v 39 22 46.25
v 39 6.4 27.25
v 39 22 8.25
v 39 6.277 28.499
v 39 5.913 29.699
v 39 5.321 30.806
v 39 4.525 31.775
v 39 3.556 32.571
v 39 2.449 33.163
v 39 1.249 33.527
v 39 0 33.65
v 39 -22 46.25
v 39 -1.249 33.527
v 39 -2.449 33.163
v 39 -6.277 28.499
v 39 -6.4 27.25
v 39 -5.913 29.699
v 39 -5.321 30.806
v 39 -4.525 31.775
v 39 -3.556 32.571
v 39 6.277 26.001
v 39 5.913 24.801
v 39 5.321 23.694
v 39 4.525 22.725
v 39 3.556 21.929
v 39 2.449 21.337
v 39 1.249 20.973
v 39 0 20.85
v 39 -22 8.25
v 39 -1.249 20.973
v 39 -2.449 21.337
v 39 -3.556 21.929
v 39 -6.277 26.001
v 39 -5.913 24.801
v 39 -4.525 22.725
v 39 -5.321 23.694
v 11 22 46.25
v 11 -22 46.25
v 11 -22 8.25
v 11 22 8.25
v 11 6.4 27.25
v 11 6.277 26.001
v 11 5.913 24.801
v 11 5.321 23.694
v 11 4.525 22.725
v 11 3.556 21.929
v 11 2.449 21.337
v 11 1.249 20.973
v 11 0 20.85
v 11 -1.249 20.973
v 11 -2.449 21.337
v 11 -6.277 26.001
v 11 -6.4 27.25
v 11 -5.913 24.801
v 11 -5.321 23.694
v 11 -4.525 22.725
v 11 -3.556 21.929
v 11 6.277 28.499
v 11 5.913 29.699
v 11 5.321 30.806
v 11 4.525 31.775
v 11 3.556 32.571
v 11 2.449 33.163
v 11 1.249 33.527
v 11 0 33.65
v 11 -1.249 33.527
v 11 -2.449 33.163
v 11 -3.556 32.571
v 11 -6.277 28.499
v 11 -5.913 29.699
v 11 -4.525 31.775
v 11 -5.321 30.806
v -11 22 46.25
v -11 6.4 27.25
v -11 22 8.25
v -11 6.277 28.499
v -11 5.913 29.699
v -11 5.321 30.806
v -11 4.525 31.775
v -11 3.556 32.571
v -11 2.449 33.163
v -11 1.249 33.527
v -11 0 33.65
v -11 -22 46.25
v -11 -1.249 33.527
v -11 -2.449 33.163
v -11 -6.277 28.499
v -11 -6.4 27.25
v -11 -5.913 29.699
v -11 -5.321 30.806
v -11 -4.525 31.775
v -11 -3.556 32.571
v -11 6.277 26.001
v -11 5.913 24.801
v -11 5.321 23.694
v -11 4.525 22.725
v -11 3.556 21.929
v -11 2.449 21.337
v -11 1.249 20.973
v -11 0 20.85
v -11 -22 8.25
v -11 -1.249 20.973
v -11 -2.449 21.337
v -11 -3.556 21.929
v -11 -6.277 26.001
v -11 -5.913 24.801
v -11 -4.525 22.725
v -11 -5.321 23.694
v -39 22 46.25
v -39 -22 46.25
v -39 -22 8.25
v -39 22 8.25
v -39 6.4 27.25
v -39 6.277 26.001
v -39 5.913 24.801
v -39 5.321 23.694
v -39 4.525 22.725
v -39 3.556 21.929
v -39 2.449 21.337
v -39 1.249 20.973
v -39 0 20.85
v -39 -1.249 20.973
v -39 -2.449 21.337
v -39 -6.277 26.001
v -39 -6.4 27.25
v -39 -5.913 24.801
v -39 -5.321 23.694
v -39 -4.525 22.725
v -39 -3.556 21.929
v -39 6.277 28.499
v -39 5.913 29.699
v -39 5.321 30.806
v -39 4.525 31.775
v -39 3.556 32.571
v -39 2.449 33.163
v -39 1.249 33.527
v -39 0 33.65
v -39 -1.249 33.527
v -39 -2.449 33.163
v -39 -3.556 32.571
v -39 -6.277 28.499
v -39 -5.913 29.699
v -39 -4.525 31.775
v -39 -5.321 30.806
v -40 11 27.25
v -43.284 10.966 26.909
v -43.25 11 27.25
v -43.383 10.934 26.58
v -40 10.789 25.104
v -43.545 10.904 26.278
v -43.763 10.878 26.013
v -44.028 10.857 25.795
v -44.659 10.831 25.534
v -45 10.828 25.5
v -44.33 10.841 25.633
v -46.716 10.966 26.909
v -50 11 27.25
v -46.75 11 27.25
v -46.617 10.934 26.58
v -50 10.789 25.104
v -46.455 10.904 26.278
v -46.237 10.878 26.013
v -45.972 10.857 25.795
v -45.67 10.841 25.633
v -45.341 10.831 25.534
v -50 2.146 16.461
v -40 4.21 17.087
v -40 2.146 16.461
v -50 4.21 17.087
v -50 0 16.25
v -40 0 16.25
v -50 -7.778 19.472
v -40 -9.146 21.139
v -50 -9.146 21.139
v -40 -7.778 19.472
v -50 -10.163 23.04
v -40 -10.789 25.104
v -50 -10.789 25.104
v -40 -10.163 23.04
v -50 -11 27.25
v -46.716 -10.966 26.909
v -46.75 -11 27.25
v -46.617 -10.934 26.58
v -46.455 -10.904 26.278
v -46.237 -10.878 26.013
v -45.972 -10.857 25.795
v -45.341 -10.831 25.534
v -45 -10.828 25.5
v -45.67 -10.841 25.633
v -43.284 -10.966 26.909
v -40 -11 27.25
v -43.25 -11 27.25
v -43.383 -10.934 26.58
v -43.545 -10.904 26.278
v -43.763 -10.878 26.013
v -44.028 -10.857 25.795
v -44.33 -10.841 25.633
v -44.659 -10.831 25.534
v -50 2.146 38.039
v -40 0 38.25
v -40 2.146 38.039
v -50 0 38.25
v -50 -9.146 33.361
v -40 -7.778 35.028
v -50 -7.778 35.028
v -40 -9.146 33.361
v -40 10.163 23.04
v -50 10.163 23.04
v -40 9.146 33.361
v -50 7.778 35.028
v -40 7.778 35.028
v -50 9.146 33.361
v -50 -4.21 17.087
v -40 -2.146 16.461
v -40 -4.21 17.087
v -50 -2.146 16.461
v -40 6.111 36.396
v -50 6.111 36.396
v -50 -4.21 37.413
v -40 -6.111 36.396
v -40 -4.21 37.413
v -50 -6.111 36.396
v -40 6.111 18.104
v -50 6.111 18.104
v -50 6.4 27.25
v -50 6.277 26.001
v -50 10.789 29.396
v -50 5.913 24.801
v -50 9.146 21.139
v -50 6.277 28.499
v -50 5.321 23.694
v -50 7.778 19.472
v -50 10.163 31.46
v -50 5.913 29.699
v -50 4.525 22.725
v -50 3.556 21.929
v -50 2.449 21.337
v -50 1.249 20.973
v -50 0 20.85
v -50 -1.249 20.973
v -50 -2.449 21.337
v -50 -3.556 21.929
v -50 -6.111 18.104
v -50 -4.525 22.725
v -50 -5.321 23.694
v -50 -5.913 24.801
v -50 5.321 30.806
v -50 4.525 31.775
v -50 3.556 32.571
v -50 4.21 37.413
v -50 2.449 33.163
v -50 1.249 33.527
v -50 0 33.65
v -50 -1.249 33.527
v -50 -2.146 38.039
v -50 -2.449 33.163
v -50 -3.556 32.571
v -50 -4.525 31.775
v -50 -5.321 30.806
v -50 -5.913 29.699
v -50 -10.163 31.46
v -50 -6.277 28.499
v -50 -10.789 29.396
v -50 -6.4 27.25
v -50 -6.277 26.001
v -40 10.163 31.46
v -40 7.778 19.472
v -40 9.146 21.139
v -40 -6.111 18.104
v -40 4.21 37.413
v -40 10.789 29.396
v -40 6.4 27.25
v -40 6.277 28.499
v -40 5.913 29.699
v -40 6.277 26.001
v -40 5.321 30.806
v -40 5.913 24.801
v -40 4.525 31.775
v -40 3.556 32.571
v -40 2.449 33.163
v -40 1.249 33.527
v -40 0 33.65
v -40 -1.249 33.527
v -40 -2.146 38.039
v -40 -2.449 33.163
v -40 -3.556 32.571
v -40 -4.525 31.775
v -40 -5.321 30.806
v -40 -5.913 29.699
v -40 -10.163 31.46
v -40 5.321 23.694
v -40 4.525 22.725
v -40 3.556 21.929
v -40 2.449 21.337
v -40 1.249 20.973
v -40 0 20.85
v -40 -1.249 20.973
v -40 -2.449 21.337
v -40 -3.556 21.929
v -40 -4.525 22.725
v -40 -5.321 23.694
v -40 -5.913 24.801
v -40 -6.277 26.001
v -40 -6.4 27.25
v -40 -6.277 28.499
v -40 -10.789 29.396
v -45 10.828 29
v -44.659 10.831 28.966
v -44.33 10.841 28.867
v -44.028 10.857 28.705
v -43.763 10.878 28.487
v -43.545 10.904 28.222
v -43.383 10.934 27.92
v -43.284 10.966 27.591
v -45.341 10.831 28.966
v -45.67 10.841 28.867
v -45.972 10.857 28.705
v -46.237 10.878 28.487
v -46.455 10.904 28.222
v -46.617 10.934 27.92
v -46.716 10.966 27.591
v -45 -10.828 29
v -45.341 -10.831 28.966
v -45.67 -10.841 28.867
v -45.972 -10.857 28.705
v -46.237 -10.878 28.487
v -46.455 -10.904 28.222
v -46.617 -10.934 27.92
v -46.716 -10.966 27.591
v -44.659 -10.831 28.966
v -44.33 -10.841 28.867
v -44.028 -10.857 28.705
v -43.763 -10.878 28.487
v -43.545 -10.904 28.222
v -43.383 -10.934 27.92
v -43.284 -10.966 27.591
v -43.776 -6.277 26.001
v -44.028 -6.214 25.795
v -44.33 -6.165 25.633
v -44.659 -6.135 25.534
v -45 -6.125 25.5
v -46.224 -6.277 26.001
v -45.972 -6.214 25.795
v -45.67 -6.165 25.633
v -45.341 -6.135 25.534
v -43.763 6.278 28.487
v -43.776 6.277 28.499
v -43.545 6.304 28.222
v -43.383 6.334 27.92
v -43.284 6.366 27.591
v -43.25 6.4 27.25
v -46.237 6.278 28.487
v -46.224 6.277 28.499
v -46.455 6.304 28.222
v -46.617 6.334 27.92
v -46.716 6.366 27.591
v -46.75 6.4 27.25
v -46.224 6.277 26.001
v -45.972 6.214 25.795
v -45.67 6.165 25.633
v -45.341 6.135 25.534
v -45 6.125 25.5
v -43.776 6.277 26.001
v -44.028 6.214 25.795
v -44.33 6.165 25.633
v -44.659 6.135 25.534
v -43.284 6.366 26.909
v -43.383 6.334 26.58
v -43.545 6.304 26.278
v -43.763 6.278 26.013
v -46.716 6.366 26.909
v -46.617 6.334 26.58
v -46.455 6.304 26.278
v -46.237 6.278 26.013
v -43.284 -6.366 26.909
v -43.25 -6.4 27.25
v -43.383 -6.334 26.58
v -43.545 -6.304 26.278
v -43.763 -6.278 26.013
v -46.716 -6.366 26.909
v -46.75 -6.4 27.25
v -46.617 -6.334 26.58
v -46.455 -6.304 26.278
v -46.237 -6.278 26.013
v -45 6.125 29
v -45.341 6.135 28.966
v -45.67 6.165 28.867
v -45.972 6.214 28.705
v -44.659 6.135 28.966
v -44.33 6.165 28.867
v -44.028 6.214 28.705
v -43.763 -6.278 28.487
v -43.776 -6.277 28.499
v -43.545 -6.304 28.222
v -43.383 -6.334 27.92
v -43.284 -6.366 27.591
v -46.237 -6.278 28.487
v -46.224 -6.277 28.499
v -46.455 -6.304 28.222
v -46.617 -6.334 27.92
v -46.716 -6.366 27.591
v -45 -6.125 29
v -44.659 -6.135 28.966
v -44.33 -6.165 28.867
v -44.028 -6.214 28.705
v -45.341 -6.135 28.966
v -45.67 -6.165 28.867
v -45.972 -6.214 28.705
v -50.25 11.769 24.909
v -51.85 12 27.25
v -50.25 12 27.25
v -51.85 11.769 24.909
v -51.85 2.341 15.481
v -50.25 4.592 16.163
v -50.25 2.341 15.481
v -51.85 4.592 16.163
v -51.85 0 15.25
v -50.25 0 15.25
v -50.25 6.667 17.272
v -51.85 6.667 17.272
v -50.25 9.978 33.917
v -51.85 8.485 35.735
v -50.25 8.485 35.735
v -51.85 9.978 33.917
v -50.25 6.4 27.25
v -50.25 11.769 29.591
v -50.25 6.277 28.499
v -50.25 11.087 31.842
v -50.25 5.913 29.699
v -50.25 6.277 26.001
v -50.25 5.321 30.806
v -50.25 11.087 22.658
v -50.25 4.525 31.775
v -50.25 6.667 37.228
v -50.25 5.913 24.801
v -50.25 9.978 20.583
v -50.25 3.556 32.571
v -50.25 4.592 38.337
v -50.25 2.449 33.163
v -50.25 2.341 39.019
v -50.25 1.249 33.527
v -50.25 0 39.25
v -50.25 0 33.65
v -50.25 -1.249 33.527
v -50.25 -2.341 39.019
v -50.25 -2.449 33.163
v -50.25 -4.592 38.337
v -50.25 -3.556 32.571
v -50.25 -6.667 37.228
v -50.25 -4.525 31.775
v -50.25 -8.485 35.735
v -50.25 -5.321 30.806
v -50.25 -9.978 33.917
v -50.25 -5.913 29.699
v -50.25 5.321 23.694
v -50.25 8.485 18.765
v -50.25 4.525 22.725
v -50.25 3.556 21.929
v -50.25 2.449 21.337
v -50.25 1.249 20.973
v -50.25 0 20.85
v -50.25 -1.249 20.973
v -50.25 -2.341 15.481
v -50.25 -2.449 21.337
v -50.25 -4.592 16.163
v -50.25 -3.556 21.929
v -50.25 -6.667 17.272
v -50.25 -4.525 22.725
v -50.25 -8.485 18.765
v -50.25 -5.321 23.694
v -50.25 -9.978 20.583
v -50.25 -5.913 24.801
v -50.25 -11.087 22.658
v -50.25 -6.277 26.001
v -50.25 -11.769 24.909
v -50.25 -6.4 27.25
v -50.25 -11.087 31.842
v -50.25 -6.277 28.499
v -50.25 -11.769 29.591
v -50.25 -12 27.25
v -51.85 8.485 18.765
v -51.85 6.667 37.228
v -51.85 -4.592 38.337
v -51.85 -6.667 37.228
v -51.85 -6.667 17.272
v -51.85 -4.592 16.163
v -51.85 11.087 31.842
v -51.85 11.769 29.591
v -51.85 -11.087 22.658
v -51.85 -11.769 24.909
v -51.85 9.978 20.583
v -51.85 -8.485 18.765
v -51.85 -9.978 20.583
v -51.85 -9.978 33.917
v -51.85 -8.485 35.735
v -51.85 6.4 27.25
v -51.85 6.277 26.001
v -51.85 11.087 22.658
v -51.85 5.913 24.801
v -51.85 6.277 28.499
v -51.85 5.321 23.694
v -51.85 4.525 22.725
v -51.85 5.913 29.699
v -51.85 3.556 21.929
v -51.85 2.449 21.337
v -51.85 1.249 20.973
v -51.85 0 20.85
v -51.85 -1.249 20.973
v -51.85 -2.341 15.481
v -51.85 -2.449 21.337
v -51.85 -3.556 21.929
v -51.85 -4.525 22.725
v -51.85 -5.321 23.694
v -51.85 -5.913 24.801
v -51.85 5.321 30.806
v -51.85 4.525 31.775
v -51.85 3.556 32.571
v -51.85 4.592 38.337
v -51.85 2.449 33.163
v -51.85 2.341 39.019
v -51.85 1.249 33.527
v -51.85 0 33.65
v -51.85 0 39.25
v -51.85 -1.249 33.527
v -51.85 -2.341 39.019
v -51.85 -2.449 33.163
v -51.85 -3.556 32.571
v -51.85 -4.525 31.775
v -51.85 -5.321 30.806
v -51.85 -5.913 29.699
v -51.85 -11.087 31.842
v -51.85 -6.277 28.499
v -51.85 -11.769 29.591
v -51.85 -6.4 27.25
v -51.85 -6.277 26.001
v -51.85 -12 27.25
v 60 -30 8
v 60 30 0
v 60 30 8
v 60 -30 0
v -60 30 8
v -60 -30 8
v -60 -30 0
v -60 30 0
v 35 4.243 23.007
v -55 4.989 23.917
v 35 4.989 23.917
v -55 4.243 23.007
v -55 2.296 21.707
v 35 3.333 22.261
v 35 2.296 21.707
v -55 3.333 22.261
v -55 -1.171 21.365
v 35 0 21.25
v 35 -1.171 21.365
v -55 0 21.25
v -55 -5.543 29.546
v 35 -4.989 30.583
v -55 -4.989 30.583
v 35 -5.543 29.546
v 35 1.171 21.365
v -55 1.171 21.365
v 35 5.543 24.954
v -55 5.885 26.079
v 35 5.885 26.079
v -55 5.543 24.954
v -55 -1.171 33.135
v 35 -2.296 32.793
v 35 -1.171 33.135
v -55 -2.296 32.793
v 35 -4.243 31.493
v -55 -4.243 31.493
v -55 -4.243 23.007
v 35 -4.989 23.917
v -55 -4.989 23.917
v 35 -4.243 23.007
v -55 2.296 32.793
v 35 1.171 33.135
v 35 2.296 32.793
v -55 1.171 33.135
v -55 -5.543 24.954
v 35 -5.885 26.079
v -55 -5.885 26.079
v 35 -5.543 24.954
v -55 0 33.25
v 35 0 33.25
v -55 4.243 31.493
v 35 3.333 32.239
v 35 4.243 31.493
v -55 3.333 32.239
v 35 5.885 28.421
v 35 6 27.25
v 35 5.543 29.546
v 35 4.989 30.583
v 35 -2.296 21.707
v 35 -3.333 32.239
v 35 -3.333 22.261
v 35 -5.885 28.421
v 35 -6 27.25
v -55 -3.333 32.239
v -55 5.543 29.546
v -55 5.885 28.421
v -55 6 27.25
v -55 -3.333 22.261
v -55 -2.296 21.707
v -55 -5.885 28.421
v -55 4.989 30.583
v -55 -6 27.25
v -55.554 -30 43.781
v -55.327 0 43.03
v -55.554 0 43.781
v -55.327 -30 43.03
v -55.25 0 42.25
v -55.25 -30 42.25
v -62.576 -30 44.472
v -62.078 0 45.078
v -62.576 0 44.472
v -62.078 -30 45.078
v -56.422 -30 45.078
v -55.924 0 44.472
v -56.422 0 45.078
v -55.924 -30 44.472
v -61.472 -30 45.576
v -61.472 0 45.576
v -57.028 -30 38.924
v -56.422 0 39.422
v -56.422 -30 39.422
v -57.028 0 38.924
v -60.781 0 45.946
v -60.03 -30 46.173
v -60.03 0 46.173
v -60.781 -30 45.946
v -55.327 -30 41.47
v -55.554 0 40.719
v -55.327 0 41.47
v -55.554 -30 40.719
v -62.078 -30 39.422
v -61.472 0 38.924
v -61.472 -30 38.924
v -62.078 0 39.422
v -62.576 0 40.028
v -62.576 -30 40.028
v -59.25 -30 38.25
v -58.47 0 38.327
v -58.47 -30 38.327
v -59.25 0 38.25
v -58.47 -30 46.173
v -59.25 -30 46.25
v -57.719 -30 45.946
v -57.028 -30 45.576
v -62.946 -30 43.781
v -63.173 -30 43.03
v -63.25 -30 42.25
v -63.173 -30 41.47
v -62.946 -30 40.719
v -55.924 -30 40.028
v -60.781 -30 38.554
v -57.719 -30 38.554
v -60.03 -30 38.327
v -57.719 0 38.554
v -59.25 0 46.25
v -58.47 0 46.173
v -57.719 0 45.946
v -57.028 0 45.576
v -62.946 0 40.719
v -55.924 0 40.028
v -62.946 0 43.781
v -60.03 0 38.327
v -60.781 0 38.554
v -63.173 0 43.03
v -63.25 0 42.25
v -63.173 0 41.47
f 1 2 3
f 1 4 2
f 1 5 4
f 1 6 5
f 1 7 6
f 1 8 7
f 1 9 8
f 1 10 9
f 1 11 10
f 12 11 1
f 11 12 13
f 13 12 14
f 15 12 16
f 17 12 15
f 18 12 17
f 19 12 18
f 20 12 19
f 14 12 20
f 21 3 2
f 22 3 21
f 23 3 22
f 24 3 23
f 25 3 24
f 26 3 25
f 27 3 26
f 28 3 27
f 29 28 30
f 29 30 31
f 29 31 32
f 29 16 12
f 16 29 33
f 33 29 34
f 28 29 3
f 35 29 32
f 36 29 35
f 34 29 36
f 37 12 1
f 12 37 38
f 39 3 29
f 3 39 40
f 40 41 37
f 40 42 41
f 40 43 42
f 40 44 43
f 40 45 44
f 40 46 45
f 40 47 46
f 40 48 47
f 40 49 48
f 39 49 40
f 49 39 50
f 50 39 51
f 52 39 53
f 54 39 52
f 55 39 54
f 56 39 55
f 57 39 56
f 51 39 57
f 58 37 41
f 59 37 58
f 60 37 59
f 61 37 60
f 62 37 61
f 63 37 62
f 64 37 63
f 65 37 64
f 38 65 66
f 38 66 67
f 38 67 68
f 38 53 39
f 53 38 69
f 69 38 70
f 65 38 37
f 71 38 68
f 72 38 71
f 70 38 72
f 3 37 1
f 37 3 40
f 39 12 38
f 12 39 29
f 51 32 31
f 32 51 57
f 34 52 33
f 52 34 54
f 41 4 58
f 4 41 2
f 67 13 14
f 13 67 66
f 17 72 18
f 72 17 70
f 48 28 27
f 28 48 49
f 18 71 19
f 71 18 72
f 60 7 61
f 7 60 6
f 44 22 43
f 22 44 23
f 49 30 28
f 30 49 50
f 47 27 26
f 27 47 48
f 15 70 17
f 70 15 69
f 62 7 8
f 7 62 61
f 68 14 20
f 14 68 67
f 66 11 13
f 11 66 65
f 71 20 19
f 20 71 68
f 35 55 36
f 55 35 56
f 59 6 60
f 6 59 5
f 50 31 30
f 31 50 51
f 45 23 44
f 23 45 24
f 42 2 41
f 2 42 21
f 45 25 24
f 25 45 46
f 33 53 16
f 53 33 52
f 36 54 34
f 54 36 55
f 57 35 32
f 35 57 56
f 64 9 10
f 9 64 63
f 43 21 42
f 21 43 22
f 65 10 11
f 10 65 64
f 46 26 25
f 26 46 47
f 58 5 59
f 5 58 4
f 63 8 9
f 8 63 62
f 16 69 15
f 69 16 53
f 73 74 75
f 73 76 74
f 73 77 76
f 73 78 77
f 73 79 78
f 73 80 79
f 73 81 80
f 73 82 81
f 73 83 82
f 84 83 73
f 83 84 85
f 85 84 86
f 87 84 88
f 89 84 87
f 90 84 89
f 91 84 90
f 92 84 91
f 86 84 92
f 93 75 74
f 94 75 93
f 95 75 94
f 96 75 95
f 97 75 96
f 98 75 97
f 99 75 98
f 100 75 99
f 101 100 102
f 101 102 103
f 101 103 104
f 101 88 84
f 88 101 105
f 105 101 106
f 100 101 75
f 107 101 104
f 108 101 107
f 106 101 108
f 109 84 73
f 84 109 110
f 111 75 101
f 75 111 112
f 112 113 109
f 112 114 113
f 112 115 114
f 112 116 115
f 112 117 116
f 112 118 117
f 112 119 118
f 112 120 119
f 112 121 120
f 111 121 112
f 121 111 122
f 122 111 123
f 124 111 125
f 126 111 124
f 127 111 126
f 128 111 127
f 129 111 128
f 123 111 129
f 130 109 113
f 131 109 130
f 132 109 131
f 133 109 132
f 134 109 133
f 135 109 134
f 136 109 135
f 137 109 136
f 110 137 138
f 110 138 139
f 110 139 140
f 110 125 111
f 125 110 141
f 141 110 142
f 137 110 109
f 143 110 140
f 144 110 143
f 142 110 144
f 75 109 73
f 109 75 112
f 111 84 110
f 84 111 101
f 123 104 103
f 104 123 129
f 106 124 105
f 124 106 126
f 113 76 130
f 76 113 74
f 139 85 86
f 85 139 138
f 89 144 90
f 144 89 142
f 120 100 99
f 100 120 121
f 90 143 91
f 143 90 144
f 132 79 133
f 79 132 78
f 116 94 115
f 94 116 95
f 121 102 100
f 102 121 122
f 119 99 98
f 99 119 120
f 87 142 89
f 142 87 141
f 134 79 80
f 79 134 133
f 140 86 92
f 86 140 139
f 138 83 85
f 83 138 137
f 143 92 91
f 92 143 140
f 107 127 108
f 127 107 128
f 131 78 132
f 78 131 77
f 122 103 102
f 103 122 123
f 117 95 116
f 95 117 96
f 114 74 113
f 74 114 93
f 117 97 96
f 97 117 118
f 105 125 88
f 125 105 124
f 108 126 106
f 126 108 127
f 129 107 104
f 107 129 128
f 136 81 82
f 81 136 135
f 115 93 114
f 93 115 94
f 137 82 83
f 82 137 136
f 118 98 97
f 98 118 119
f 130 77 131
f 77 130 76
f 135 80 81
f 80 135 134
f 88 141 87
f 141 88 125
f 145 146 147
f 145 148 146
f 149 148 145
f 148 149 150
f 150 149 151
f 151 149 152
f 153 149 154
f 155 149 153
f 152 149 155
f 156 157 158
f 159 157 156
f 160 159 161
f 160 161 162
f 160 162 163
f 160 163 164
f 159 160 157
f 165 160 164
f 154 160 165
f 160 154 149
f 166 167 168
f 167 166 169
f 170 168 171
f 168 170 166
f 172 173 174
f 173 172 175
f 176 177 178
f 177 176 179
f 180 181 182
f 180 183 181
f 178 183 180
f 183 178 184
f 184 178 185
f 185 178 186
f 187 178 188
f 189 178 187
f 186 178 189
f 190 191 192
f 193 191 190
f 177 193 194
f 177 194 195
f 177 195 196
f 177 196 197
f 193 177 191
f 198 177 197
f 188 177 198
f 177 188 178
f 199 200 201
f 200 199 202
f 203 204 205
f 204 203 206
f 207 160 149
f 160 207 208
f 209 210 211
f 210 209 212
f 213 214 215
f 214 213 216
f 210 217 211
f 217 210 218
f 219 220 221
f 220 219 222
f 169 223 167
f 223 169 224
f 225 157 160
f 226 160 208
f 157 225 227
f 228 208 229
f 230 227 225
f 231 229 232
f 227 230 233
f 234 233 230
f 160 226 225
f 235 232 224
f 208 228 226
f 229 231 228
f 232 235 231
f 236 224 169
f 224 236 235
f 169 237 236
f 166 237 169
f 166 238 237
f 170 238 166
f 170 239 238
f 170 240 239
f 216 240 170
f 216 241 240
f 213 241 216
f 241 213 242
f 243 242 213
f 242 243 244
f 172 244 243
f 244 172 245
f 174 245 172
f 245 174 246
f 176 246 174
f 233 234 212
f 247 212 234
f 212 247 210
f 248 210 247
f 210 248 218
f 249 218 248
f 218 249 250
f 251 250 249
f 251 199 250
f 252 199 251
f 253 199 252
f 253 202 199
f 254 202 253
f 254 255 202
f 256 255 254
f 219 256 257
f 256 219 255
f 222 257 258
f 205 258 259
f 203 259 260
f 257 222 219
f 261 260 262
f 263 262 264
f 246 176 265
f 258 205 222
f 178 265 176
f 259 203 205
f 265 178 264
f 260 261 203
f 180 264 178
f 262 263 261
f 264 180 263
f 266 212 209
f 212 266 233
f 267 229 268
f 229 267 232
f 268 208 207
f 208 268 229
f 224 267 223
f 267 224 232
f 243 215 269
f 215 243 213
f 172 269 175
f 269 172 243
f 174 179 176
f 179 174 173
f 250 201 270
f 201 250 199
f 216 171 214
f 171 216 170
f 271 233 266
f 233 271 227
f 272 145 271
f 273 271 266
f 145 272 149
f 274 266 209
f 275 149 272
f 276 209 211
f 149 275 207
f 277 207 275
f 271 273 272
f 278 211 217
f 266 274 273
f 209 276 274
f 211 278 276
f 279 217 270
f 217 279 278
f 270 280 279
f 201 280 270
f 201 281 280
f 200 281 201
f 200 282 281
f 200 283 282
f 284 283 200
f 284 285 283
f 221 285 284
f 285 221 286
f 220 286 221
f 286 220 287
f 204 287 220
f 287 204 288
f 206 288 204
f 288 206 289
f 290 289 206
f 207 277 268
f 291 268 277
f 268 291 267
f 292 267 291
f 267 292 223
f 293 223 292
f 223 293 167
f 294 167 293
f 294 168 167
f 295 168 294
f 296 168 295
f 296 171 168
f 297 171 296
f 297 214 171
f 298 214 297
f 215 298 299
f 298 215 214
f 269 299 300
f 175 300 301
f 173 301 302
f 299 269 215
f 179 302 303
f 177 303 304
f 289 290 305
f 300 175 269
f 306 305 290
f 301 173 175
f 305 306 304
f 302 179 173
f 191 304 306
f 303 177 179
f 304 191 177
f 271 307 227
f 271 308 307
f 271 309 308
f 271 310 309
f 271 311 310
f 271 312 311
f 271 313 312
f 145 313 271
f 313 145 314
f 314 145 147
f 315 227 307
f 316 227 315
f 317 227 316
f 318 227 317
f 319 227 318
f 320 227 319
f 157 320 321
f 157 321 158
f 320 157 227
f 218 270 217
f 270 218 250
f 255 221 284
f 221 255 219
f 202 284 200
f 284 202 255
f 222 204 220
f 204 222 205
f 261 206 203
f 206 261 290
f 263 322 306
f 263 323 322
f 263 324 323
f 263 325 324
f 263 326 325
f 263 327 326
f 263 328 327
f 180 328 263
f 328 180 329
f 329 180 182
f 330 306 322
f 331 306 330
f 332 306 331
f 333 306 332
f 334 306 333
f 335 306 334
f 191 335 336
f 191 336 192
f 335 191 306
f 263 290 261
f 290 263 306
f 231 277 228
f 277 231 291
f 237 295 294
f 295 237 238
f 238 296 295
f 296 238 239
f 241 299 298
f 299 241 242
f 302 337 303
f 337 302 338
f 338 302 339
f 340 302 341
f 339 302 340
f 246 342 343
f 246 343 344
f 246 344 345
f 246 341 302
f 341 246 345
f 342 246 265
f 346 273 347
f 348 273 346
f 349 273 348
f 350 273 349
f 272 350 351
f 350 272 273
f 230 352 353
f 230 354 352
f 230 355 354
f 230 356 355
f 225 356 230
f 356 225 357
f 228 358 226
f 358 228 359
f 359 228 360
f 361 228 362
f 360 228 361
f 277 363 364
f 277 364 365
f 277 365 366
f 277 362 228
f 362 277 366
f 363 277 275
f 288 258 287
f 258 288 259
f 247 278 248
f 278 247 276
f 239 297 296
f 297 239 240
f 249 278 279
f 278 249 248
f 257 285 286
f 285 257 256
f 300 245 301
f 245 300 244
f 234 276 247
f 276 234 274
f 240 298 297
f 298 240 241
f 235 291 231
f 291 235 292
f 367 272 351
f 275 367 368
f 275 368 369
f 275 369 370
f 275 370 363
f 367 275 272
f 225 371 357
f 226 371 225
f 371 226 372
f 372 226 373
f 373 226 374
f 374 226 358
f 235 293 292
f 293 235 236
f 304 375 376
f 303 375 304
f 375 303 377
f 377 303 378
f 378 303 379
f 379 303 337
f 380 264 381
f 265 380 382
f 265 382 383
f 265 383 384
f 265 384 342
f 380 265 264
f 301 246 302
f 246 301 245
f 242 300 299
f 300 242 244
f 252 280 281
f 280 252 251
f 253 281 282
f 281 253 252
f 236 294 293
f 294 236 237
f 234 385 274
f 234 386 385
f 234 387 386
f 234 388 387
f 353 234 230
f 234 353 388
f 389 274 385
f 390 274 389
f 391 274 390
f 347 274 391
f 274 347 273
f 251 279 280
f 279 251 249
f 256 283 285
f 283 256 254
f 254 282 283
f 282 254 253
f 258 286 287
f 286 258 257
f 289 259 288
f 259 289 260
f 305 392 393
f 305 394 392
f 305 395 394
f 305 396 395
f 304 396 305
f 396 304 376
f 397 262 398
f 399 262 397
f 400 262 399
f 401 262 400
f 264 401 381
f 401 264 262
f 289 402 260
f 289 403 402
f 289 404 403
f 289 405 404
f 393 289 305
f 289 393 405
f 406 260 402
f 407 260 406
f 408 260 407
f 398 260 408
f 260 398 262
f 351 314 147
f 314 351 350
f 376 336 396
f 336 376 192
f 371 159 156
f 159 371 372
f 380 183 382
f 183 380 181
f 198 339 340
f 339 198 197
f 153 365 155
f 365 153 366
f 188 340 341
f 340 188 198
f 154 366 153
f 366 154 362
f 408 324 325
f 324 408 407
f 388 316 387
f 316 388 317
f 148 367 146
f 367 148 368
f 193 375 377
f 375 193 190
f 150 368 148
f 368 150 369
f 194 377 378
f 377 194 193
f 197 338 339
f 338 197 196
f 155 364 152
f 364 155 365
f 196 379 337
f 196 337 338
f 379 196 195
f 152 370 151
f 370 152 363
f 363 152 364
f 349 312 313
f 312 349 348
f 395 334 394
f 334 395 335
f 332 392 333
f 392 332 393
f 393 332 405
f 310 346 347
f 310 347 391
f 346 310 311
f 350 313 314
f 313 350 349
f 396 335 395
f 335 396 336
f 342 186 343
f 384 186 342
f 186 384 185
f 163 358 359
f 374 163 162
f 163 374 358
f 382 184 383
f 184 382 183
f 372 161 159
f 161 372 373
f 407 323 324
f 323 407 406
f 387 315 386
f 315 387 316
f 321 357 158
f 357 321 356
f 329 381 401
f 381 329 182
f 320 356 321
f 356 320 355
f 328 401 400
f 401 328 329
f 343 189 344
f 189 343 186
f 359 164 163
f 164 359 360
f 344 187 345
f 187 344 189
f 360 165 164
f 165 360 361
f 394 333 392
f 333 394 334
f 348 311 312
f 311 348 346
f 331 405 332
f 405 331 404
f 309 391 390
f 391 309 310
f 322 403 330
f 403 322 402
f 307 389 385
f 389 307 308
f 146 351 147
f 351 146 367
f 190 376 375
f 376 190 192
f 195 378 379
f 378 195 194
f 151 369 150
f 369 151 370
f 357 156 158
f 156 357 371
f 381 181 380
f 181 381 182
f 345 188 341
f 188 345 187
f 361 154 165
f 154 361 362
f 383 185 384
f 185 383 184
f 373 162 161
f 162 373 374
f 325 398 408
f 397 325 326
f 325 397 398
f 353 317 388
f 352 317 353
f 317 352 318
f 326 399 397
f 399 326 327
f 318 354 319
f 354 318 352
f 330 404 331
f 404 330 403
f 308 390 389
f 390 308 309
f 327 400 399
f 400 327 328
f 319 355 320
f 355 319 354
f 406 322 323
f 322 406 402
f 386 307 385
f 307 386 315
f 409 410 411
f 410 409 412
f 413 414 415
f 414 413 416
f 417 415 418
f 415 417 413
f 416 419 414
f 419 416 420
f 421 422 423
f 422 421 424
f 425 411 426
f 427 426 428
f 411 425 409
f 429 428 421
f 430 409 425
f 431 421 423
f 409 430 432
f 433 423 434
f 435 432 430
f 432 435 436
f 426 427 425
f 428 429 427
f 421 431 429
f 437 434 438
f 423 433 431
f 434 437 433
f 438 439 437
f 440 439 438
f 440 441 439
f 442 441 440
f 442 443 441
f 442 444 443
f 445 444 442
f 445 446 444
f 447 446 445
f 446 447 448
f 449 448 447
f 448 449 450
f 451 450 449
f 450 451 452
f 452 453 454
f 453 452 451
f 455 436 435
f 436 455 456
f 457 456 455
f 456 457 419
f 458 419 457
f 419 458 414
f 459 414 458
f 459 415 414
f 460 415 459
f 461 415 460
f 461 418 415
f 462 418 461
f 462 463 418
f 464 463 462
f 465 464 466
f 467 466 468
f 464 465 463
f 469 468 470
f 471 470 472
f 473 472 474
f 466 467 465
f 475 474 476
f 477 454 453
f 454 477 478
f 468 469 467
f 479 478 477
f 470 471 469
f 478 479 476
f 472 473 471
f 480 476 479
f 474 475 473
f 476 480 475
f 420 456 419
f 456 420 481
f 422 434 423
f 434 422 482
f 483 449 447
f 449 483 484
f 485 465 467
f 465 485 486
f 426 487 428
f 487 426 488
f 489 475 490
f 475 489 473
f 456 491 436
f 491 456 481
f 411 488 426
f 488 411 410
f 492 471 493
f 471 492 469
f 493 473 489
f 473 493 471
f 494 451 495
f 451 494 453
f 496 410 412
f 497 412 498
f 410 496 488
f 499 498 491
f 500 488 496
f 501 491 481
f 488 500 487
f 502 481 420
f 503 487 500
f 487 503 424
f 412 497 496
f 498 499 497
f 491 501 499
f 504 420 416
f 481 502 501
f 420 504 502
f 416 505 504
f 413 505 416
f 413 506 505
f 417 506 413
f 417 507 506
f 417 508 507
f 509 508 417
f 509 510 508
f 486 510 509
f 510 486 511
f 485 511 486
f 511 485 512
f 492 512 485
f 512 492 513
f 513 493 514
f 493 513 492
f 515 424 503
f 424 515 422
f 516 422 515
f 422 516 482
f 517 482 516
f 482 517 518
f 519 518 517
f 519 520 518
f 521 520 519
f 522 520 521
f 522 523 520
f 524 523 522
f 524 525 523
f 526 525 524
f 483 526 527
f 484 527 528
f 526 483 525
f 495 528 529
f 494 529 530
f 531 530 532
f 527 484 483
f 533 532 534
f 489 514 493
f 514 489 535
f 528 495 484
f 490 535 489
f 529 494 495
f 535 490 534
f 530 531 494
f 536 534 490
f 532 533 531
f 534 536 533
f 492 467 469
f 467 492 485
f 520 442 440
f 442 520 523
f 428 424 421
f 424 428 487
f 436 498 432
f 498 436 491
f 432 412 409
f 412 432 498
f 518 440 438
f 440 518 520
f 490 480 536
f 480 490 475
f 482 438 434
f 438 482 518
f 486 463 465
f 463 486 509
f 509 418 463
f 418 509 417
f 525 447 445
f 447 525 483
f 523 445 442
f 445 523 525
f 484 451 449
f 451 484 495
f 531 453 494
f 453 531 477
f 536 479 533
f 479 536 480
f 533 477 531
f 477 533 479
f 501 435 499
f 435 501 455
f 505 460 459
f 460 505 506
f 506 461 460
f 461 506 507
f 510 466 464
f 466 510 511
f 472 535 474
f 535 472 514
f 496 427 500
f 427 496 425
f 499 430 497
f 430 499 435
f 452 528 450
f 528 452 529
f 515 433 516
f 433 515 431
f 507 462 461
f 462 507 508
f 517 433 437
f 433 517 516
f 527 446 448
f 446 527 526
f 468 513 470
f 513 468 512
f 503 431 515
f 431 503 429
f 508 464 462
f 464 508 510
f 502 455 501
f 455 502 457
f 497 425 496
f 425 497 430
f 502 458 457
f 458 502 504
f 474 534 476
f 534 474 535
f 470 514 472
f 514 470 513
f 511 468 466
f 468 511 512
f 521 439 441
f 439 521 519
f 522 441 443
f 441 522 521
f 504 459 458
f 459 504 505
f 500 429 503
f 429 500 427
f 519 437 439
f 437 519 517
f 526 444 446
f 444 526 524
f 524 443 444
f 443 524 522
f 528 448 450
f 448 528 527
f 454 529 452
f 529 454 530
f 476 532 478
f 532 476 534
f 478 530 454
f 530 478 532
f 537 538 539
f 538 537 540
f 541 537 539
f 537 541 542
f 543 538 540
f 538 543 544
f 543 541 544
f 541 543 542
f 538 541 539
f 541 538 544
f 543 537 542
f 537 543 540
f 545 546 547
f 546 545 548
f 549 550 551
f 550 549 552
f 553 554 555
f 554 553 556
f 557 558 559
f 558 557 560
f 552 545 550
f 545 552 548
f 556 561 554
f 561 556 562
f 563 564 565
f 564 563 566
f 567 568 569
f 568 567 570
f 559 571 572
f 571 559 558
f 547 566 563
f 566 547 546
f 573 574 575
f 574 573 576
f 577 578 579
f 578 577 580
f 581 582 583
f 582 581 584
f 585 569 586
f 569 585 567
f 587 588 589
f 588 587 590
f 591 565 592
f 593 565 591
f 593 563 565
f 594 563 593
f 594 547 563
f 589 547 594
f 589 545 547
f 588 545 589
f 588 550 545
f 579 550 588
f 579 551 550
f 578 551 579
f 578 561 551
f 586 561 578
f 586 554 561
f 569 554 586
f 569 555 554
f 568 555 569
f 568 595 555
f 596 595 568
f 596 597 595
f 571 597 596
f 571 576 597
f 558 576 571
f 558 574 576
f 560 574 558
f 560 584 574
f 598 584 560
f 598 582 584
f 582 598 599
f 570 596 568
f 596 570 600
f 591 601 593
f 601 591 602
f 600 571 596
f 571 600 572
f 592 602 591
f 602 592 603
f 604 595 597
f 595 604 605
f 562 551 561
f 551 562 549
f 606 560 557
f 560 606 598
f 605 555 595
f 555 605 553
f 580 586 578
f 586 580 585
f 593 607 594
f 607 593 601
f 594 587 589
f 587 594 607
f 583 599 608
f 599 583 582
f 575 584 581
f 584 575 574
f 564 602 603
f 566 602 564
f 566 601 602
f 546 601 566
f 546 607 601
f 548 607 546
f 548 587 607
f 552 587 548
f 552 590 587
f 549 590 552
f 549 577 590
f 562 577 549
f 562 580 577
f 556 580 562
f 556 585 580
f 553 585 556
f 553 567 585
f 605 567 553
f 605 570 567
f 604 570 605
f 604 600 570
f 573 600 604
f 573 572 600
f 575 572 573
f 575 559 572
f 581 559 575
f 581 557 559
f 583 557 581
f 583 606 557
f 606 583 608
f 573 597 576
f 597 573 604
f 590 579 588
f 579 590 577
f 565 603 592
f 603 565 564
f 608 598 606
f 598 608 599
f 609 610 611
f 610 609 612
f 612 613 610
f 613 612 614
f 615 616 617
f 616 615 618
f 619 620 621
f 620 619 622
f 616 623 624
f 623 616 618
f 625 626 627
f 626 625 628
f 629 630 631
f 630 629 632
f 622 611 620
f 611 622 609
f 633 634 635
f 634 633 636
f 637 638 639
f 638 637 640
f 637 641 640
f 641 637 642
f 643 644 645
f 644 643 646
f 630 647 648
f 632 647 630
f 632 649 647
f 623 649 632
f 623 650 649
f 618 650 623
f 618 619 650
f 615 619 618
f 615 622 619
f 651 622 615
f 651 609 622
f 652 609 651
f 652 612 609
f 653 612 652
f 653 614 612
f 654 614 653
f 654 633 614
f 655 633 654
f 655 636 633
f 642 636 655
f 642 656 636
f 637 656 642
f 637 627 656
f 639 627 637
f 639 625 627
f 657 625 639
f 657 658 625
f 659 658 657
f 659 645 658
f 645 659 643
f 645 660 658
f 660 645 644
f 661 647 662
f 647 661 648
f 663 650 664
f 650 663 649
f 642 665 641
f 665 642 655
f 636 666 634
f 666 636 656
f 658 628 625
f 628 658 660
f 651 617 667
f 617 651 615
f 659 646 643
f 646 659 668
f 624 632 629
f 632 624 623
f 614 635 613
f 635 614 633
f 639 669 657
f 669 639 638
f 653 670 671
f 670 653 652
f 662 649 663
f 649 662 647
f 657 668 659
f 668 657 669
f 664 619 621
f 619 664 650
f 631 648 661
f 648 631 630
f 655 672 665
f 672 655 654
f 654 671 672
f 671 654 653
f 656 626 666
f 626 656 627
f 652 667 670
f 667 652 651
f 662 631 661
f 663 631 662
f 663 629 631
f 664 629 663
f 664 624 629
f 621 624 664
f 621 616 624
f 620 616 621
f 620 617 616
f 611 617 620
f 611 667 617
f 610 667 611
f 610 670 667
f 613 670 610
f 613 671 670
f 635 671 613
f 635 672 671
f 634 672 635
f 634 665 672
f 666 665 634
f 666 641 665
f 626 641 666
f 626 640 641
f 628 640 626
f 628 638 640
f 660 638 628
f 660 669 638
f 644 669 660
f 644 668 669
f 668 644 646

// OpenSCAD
$fn = 32;

// ------------------------------------------------------------------------
// Machine vise: screw d12, jaws 28 x 38 mm
// Every part is its own module, assembly() places every instance.
// ------------------------------------------------------------------------

// --- part 1 ---
module vise_bed() {
  difference() {
    translate([-60, -30, 0]) cube([120, 60, 8]);
  }
}

// --- part 2 ---
module vise_jaw() {
  difference() {
    translate([-14, -22, 0]) cube([28, 44, 38]);
    translate([0, 0, 19]) rotate([0, 90, 0]) cylinder(h = 30, d = 12.8, center = true);
  }
}

// --- part 3 ---
module vise_screw() {
  translate([0, 0, -45]) cylinder(h = 90, d = 12);
}

// --- part 4 ---
module screw_collar() {
  difference() {
    cylinder(h = 10, d = 22);
    translate([0, 0, -1]) cylinder(h = 12, d = 12.8);
    translate([0, 0, 5]) rotate([90, 0, 0]) cylinder(h = 24, d = 3.5, center = true);
  }
}

// --- part 5 ---
module screw_washer() {
  difference() {
      translate([0, 0, 0]) cylinder(h = 1.6, d = 24);
      translate([0, 0, -1]) cylinder(h = 3.6, d = 12.8);
    }
}

// --- part 6 ---
module vise_handle() {
  cylinder(h = 30, d = 8);
}

// --- assembly ---
module assembly() {
  color([0.80, 0.24, 0.20]) translate([0, 0, 0]) rotate([0, 0, 0]) vise_bed();
  color([0.20, 0.45, 0.75]) translate([25, 0, 8.25]) rotate([0, 0, 0]) vise_jaw();
  color([0.25, 0.62, 0.32]) translate([-25, 0, 8.25]) rotate([0, 0, 0]) vise_jaw();
  color([0.92, 0.70, 0.18]) translate([-10, 0, 27.25]) rotate([0, 90, 0]) vise_screw();
  color([0.58, 0.35, 0.70]) translate([-50, 0, 27.25]) rotate([0, 90, 0]) screw_collar();
  color([0.16, 0.66, 0.66]) translate([-51.85, 0, 27.25]) rotate([0, 90, 0]) screw_washer();
  color([0.85, 0.48, 0.18]) translate([-59.25, 0, 42.25]) rotate([90, 0, 0]) vise_handle();
}

assembly();
